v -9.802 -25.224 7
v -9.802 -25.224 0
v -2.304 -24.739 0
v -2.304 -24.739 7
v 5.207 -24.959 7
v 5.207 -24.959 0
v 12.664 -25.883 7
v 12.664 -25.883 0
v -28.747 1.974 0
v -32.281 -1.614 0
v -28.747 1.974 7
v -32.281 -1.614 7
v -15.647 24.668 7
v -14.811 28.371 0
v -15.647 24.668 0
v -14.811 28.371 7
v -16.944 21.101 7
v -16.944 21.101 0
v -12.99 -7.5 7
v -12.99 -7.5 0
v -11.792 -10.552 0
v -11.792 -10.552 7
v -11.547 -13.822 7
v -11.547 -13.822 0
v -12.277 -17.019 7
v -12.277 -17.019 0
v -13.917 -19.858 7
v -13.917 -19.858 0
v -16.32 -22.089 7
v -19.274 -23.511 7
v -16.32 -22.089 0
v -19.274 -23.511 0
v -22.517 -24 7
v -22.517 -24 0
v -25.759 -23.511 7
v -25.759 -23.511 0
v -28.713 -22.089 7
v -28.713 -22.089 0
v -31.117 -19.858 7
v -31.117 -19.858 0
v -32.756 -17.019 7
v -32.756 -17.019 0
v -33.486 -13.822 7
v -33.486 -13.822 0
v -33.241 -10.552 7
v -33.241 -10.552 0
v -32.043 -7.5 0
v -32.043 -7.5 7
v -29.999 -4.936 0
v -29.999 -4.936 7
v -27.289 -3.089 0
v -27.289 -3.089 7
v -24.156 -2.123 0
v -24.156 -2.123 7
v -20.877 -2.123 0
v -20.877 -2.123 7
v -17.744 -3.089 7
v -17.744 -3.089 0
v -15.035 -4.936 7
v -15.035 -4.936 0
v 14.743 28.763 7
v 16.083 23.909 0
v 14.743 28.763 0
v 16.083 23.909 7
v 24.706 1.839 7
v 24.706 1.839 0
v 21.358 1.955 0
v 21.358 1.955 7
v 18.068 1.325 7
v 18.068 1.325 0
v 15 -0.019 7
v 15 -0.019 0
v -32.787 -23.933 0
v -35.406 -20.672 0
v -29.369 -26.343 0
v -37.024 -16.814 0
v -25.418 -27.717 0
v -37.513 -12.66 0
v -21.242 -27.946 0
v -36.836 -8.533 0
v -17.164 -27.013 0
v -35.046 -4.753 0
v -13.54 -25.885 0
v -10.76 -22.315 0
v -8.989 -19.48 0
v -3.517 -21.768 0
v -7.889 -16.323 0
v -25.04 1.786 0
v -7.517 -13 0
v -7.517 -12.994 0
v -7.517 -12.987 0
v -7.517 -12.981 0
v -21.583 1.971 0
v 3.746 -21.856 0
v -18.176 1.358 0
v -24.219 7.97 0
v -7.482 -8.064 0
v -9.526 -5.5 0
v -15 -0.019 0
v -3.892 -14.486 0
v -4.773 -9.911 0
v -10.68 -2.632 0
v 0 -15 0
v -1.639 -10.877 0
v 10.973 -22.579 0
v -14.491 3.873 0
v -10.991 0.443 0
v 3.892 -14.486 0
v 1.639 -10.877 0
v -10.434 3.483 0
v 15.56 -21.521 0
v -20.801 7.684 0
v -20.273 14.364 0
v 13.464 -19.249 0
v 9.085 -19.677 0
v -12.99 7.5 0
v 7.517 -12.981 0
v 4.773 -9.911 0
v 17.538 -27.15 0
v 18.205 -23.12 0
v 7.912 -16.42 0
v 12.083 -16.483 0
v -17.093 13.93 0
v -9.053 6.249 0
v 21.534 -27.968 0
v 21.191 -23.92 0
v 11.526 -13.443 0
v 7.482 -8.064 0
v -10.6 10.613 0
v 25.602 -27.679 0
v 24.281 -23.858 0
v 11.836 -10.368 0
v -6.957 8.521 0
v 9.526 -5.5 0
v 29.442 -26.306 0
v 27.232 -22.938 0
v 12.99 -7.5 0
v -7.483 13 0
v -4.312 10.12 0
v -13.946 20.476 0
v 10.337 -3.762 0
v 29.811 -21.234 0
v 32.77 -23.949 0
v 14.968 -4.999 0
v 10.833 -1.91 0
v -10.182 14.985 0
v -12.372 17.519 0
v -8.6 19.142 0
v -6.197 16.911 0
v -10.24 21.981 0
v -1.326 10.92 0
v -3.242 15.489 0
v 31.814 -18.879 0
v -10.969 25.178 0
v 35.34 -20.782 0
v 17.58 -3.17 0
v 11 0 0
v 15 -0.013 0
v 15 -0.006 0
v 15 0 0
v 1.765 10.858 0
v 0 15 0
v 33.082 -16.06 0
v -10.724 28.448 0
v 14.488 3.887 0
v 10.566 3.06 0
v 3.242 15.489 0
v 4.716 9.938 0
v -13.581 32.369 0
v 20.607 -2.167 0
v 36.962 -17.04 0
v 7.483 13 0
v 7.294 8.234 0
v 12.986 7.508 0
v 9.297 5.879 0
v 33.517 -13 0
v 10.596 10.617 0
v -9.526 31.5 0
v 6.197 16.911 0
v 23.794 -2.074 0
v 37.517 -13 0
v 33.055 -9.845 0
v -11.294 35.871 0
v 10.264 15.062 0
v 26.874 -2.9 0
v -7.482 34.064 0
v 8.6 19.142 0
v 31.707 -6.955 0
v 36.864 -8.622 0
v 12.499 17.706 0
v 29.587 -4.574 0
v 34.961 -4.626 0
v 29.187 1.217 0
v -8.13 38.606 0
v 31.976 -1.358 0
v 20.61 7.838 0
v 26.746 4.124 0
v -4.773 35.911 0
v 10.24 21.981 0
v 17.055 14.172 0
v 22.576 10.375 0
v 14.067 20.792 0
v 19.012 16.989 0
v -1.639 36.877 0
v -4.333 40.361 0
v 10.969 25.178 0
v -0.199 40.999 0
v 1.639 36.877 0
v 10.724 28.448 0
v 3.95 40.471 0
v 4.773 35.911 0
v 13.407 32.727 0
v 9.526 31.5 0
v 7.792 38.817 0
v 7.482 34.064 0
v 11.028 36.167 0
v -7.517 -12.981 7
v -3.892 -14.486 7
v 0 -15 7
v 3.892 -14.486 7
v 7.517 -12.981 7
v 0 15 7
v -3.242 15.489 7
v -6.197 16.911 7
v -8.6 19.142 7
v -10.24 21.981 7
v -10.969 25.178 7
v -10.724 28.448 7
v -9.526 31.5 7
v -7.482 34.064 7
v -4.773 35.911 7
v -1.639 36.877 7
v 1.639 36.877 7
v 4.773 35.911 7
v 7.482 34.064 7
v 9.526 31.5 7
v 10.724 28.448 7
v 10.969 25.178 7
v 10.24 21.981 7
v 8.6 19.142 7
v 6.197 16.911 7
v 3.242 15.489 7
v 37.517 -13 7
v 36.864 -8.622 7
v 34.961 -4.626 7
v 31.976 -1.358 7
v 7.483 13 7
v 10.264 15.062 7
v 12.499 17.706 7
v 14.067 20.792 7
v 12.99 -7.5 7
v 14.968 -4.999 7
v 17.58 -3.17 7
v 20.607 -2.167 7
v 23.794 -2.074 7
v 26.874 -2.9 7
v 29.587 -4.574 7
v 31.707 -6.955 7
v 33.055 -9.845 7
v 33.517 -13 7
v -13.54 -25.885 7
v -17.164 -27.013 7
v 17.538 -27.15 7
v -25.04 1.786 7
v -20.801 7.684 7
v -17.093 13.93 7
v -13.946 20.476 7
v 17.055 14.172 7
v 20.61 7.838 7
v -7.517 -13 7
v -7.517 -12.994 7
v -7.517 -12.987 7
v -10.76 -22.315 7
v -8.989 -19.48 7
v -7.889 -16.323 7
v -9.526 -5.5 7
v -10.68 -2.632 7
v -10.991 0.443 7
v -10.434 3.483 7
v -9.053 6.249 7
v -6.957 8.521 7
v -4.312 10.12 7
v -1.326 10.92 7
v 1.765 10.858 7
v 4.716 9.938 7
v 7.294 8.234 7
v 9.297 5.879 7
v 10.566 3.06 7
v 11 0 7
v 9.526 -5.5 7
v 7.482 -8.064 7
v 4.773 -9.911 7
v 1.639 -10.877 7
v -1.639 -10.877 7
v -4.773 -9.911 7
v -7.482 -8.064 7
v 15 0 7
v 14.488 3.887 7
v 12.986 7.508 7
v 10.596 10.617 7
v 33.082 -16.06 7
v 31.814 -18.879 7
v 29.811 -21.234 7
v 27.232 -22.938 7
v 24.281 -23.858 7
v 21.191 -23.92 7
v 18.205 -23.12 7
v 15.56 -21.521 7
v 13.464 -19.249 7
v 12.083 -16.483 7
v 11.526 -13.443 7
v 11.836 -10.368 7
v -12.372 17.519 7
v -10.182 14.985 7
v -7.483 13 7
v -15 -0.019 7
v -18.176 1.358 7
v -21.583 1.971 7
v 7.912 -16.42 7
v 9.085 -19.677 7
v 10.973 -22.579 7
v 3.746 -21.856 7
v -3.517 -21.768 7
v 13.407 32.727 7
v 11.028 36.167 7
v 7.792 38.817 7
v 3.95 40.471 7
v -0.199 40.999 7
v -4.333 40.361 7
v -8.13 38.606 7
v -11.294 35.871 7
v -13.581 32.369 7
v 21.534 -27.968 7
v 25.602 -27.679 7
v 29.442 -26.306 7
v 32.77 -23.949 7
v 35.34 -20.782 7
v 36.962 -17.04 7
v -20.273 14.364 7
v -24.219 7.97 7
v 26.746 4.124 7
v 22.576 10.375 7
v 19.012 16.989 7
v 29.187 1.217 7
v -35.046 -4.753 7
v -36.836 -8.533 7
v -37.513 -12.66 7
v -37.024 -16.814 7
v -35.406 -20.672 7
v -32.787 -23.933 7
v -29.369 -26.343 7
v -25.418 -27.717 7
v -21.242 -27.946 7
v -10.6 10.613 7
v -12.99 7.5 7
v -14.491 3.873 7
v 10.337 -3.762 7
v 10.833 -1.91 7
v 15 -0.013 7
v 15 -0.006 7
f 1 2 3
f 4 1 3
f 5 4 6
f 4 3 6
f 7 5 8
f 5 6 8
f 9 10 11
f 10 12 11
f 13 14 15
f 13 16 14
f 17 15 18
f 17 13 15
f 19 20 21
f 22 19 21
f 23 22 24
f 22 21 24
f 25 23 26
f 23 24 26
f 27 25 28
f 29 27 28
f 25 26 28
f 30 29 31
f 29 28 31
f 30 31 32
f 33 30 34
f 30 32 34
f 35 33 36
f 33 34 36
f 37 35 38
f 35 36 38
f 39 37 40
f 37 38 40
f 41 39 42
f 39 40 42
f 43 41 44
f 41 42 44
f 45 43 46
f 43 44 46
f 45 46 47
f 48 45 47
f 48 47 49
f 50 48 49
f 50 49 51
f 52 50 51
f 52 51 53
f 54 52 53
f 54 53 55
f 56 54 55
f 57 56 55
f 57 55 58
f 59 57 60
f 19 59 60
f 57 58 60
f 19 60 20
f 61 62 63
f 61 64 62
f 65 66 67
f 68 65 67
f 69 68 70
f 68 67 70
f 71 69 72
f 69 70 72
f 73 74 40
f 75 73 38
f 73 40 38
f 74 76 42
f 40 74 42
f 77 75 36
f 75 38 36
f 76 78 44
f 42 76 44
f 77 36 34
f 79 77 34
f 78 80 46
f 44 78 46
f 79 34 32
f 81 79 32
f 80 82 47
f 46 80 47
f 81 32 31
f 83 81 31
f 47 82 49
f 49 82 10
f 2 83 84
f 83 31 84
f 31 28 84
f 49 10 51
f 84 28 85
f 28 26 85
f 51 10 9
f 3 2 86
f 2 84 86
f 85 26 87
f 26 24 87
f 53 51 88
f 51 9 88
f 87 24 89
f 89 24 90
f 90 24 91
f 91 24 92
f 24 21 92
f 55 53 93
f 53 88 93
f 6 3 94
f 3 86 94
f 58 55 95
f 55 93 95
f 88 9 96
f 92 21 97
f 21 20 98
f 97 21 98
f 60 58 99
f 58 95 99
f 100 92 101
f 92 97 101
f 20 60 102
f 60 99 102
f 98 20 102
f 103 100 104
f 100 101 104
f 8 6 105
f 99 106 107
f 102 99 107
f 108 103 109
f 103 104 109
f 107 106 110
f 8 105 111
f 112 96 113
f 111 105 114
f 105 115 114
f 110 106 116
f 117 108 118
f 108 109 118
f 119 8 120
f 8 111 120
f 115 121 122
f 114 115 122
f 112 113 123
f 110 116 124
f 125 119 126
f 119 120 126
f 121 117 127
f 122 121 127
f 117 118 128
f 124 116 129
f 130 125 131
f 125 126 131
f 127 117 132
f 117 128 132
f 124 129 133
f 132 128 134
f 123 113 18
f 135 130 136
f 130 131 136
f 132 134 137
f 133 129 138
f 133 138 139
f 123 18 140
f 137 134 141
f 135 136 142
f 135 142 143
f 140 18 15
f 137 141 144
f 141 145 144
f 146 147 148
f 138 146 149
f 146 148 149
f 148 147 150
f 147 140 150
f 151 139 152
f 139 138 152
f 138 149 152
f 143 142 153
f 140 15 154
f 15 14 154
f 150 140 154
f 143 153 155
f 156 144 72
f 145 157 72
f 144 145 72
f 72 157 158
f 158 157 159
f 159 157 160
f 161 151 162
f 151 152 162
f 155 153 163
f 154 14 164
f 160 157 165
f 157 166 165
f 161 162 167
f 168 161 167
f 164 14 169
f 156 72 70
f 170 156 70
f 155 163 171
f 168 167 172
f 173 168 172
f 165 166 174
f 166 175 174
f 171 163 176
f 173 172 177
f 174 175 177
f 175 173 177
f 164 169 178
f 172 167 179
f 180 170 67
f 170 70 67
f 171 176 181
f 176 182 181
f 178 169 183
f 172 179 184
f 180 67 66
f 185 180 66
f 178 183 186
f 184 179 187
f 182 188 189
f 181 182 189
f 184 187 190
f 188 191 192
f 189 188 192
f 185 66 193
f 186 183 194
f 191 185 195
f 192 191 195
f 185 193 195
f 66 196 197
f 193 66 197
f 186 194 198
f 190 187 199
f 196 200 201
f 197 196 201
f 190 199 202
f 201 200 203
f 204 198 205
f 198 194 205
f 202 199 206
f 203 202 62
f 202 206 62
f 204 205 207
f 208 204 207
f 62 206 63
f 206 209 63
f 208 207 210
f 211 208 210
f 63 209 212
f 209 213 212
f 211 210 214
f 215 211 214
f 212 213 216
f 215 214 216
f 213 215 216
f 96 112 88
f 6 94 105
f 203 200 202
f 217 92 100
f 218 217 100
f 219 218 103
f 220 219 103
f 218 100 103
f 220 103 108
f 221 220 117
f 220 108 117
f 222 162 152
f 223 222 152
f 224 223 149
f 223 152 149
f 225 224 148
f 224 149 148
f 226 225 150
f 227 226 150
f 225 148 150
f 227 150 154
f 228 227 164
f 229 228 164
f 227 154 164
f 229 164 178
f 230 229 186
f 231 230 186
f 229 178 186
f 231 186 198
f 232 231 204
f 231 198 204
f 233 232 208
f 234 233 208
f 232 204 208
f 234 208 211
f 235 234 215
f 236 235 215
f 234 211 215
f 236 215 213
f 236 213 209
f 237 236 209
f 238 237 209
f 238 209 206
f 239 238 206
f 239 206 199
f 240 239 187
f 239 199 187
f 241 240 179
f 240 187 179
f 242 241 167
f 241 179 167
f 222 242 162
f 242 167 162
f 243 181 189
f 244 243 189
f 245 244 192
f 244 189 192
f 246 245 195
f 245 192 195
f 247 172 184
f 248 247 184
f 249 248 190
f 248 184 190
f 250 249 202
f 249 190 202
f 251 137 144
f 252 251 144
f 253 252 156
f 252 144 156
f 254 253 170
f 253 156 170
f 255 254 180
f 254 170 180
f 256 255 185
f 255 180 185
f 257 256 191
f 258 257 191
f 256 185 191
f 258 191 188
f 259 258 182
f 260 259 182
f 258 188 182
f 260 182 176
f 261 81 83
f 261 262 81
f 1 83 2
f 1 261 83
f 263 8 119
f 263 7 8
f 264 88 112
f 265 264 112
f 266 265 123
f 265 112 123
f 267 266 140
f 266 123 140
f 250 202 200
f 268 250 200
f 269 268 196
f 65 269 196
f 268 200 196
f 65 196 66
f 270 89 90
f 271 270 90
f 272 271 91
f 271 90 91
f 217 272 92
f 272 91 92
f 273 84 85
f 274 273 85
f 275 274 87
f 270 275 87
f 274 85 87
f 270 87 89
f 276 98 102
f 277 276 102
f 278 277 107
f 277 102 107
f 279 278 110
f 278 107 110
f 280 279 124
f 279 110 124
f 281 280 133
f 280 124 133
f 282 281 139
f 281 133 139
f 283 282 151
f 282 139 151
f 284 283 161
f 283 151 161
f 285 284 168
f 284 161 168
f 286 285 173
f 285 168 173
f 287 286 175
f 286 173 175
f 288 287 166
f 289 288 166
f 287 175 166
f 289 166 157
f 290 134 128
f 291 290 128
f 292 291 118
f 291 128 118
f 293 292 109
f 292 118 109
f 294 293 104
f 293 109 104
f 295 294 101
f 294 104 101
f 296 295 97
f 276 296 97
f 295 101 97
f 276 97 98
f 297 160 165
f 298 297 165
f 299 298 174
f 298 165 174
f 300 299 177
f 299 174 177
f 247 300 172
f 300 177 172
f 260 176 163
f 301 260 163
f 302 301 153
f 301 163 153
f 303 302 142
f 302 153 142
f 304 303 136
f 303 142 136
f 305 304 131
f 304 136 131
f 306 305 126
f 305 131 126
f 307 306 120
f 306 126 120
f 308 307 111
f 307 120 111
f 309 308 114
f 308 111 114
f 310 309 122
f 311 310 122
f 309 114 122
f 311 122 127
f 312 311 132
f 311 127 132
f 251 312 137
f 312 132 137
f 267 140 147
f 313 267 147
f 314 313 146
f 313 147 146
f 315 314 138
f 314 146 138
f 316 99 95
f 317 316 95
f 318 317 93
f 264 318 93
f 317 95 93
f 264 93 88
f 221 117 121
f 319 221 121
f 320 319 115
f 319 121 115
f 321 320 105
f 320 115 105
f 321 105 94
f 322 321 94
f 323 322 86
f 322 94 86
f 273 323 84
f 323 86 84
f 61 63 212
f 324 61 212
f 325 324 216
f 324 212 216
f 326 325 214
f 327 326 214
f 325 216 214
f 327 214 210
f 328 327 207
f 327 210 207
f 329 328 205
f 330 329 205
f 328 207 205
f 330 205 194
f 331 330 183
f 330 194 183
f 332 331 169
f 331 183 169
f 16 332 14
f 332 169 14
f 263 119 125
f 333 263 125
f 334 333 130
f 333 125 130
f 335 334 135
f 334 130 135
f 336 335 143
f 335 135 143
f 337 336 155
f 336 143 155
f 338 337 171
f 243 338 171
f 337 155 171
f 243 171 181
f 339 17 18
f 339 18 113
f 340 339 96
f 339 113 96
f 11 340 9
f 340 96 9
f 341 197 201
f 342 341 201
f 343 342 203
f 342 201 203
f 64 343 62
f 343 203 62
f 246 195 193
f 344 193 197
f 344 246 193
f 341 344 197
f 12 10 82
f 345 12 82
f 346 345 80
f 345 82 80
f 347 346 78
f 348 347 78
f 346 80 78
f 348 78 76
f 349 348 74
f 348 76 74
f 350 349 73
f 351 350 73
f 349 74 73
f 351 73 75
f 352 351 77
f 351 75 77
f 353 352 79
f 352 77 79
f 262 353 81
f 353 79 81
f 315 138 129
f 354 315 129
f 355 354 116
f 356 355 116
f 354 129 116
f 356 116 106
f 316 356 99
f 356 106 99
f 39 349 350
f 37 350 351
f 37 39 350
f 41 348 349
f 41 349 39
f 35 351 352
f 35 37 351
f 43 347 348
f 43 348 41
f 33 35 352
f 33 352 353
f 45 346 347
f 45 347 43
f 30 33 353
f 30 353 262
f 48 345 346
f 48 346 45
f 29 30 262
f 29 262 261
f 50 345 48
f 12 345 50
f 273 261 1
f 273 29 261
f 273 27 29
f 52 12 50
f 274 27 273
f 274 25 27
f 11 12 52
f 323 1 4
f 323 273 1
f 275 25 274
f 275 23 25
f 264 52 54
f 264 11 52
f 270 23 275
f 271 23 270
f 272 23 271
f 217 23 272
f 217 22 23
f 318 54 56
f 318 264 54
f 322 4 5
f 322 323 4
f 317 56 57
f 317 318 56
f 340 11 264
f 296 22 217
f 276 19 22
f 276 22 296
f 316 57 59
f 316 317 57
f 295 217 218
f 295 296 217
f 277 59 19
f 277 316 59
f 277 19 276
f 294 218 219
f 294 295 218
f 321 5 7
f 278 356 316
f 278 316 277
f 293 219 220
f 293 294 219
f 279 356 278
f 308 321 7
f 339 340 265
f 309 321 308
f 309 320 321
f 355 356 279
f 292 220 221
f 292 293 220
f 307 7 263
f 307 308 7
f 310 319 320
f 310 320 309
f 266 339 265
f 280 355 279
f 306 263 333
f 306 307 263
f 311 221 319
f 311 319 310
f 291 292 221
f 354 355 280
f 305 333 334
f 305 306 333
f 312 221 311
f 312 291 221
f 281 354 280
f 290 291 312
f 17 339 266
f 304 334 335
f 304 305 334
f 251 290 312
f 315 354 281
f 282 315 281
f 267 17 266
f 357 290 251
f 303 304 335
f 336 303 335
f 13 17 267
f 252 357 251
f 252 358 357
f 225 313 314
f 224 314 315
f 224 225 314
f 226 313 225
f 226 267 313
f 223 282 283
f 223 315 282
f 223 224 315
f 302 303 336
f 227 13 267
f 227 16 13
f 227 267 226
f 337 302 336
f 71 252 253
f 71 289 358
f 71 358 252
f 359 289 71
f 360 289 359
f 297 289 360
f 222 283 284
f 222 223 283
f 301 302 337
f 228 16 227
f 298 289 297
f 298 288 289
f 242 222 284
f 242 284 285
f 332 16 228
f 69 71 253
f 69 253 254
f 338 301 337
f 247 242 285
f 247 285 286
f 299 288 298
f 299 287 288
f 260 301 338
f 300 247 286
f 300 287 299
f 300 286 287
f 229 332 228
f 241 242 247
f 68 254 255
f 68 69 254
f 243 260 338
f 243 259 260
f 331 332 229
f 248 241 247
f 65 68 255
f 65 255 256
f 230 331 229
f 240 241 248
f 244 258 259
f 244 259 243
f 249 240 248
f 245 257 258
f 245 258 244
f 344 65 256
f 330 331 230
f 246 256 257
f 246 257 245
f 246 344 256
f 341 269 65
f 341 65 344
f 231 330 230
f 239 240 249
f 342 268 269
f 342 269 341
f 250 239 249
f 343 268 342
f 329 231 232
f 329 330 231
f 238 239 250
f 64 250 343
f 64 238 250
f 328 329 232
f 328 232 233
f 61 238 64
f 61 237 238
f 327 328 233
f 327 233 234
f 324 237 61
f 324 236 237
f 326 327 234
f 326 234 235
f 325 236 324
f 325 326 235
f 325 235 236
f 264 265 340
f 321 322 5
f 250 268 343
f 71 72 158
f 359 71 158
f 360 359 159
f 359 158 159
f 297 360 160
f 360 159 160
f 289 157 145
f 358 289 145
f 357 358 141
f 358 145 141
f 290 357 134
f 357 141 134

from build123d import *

# Parameters (mm, degrees)
F1_DEPTH = 7
F2_R     = 30


with BuildPart() as f1:
    # F0 (on Top) → F1 (new body)
    with BuildSketch(Plane.XY):
        with BuildLine():
            ThreePointArc((-13.9458281821, 20.4760633317), (-11.3479038896, 16.1905618249), (-7.4833147735, 13))
            ThreePointArc((-7.4833147735, 13), (-3.8729833256, 14.4913767517), (4.26e-08, 15))
            ThreePointArc((4.26e-08, 15), (3.8729833668, 14.4913767407), (7.4833147735, 13))
            ThreePointArc((7.4833147735, 13), (11.4579364901, 16.3193134856), (14.0670033826, 20.7923694606))
            ThreePointArc((14.0670033826, 20.7923694606), (14.7649085798, 23.3547259819), (15, 26))
            ThreePointArc((15, 26), (14.9881318268, 26.5965771885), (14.9525460877, 27.1922103396))
            ThreePointArc((14.9525460877, 27.1922103396), (-0.6061990993, 40.9877457495), (-14.999987636, 25.9807406984))
            ThreePointArc((-14.999987636, 25.9807406984), (-14.7322921357, 23.1787292883), (-13.9458281821, 20.4760633317))
        make_face()
        with BuildLine():
            ThreePointArc((11, 26), (7.7781746081, 18.221825422), (4.26e-08, 15))
            ThreePointArc((4.26e-08, 15), (-7.7781746081, 33.778174578), (11, 26))
        make_face(mode=Mode.SUBTRACT)
        with BuildLine():
            ThreePointArc((-7.4833147735, 13), (-3.8729833208, 11.508623247), (5.26e-08, 11))
            ThreePointArc((5.26e-08, 11), (3.8729833716, 11.5086232606), (7.4833147735, 13))
            ThreePointArc((7.4833147735, 13), (3.8729833668, 14.4913767407), (4.26e-08, 15))
            ThreePointArc((4.26e-08, 15), (-3.8729833256, 14.4913767517), (-7.4833147735, 13))
        make_face()
        with BuildLine():
            ThreePointArc((5.26e-08, 11), (7.7781746116, 7.7781745745), (11, 0))
            ThreePointArc((11, 0), (10.6251840814, -2.8470095251), (9.5262794117, -5.5000000519))
            ThreePointArc((9.5262794117, -5.5000000519), (11.9032517523, -2.4002096819), (14.999987636, -0.0192593016))
            ThreePointArc((14.999987636, -0.0192593016), (14.999996909, -0.0096296528), (15, 0))
            ThreePointArc((15, 0), (12.9855635535, 7.5083379784), (7.4833147735, 13))
            ThreePointArc((7.4833147735, 13), (3.8729833716, 11.5086232606), (5.26e-08, 11))
        make_face()
        with BuildLine():
            ThreePointArc((15, 26), (14.7649085798, 23.3547259819), (14.0670033826, 20.7923694606))
            ThreePointArc((14.0670033826, 20.7923694606), (18.7632858244, 10.9661480048), (24.7057051058, 1.8394098167))
            ThreePointArc((24.7057051058, 1.8394098167), (27.439514459, 1.1691746013), (29.9999752719, 0))
            ThreePointArc((29.9999752719, 0), (21.1431293427, 12.8583865681), (14.9525460877, 27.1922103396))
            ThreePointArc((14.9525460877, 27.1922103396), (14.9881318268, 26.5965771885), (15, 26))
        make_face()
        with BuildLine():
            ThreePointArc((24.7057051058, 1.8394098167), (19.6953897867, 1.7322921357), (14.999987636, -0.0192593016))
            ThreePointArc((14.999987636, -0.0192593016), (14.4863920627, -3.8915864381), (12.9903810244, -7.5000000561))
            ThreePointArc((12.9903810244, -7.5000000561), (10.613408702, -10.5997903623), (7.5166728624, -12.9807406984))
            ThreePointArc((7.5166728624, -12.9807406984), (8.4039718058, -18.0825208181), (10.9732184665, -22.5785670147))
            ThreePointArc((10.9732184665, -22.5785670147), (13.3069353398, -24.8398041582), (16.0728718952, -26.545389933))
            ThreePointArc((16.0728718952, -26.545389933), (30.5273774124, -25.681814323), (37.5166604984, -13))
            ThreePointArc((37.5166604984, -13), (35.5022240519, -5.4916620216), (29.9999752719, 0))
            ThreePointArc((29.9999752719, 0), (27.439514459, 1.1691746013), (24.7057051058, 1.8394098167))
        make_face()
        with BuildLine():
            ThreePointArc((33.5166604984, -13), (19.6696510336, -23.6251840976), (12.9903810244, -7.5000000561))
            ThreePointArc((12.9903810244, -7.5000000561), (25.3636699632, -2.3748159024), (33.5166604984, -13))
        make_face(mode=Mode.SUBTRACT)
        with BuildLine():
            ThreePointArc((14.999987636, -0.0192593016), (11.9032517523, -2.4002096819), (9.5262794117, -5.5000000519))
            ThreePointArc((9.5262794117, -5.5000000519), (8.0302684195, -9.1084136221), (7.5166728624, -12.9807406984))
            ThreePointArc((7.5166728624, -12.9807406984), (10.613408702, -10.5997903623), (12.9903810244, -7.5000000561))
            ThreePointArc((12.9903810244, -7.5000000561), (14.4863920627, -3.8915864381), (14.999987636, -0.0192593016))
        make_face()
        with BuildLine():
            ThreePointArc((7.5166728624, -12.9807406984), (8.0302684195, -9.1084136221), (9.5262794117, -5.5000000519))
            ThreePointArc((9.5262794117, -5.5000000519), (-5.2e-09, -11), (-9.5262794169, -5.5000000429))
            ThreePointArc((-9.5262794169, -5.5000000429), (-8.0302684209, -9.1084136171), (-7.5166728624, -12.9807406984))
            ThreePointArc((-7.5166728624, -12.9807406984), (0, -15), (7.5166728624, -12.9807406984))
        make_face()
        with BuildLine():
            ThreePointArc((16.0728718952, -26.545389933), (13.3069353398, -24.8398041582), (10.9732184665, -22.5785670147))
            ThreePointArc((10.9732184665, -22.5785670147), (0.1153198416, -21.7325561849), (-10.7598769237, -22.3154731484))
            ThreePointArc((-10.7598769237, -22.3154731484), (-12.7072223233, -24.3479038896), (-14.999987636, -25.9807406984))
            ThreePointArc((-14.999987636, -25.9807406984), (0.5641247483, -24.7396804103), (16.0728718952, -26.545389933))
        make_face()
        with BuildLine():
            ThreePointArc((-7.5166604984, -13), (-7.5166635894, -12.9903703472), (-7.5166728624, -12.9807406984))
            ThreePointArc((-7.5166728624, -12.9807406984), (-10.6134087435, -10.5997903208), (-12.990381083, -7.4999999545))
            ThreePointArc((-12.990381083, -7.4999999545), (-14.4863920779, -3.8915863815), (-14.999987636, -0.0192593016))
            ThreePointArc((-14.999987636, -0.0192593016), (-19.8619082959, 1.7632073325), (-25.0402218491, 1.7861975541))
            ThreePointArc((-25.0402218491, 1.7861975541), (-28.1653690959, 0.8957580283), (-31.025417983, -0.6468204065))
            ThreePointArc((-31.025417983, -0.6468204065), (-35.1933295133, -21.0188566945), (-14.999987636, -25.9807406984))
            ThreePointArc((-14.999987636, -25.9807406984), (-12.7072223233, -24.3479038896), (-10.7598769237, -22.3154731484))
            ThreePointArc((-10.7598769237, -22.3154731484), (-8.3506491752, -17.9319492282), (-7.5166604984, -13))
        make_face()
        with BuildLine():
            ThreePointArc((-11.5166604984, -13), (-33.1418445808, -15.8470095215), (-12.990381083, -7.4999999545))
            ThreePointArc((-12.990381083, -7.4999999545), (-11.891476416, -10.1529904785), (-11.5166604984, -13))
        make_face(mode=Mode.SUBTRACT)
        with BuildLine():
            ThreePointArc((-7.5166728624, -12.9807406984), (-8.0302684209, -9.1084136171), (-9.5262794169, -5.5000000429))
            ThreePointArc((-9.5262794169, -5.5000000429), (-11.903251756, -2.4002096782), (-14.999987636, -0.0192593016))
            ThreePointArc((-14.999987636, -0.0192593016), (-14.4863920779, -3.8915863815), (-12.990381083, -7.4999999545))
            ThreePointArc((-12.990381083, -7.4999999545), (-10.6134087435, -10.5997903208), (-7.5166728624, -12.9807406984))
        make_face()
        with BuildLine():
            ThreePointArc((-9.5262794169, -5.5000000429), (-9.5262794409, 5.5000000013), (5.26e-08, 11))
            ThreePointArc((5.26e-08, 11), (-3.8729833208, 11.508623247), (-7.4833147735, 13))
            ThreePointArc((-7.4833147735, 13), (-12.9903810568, 7.5), (-14.999987636, -0.0192593016))
            ThreePointArc((-14.999987636, -0.0192593016), (-11.903251756, -2.4002096782), (-9.5262794169, -5.5000000429))
        make_face()
        with BuildLine():
            ThreePointArc((-25.0402218491, 1.7861975541), (-18.8786056661, 10.76640818), (-13.9458281821, 20.4760633317))
            ThreePointArc((-13.9458281821, 20.4760633317), (-14.7322921357, 23.1787292883), (-14.999987636, 25.9807406984))
            ThreePointArc((-14.999987636, 25.9807406984), (-21.707254091, 11.8812938422), (-31.025417983, -0.6468204065))
            ThreePointArc((-31.025417983, -0.6468204065), (-28.1653690959, 0.8957580283), (-25.0402218491, 1.7861975541))
        make_face()
    extrude(amount=F1_DEPTH)

    # F2
    f2_edges = [f1.edges().sort_by_distance(p)[0] for p in [
        (-14.999988, 25.980741, 3.5),
        (-31.025418, -0.64682, 3.5),
        (-14.999988, -25.980741, 3.5),
        (16.072872, -26.54539, 3.5),
        (14.952546, 27.19221, 3.5),
        (29.999975, 0, 3.5),
    ]]
    fillet(f2_edges, radius=F2_R)


solid = f1.part
